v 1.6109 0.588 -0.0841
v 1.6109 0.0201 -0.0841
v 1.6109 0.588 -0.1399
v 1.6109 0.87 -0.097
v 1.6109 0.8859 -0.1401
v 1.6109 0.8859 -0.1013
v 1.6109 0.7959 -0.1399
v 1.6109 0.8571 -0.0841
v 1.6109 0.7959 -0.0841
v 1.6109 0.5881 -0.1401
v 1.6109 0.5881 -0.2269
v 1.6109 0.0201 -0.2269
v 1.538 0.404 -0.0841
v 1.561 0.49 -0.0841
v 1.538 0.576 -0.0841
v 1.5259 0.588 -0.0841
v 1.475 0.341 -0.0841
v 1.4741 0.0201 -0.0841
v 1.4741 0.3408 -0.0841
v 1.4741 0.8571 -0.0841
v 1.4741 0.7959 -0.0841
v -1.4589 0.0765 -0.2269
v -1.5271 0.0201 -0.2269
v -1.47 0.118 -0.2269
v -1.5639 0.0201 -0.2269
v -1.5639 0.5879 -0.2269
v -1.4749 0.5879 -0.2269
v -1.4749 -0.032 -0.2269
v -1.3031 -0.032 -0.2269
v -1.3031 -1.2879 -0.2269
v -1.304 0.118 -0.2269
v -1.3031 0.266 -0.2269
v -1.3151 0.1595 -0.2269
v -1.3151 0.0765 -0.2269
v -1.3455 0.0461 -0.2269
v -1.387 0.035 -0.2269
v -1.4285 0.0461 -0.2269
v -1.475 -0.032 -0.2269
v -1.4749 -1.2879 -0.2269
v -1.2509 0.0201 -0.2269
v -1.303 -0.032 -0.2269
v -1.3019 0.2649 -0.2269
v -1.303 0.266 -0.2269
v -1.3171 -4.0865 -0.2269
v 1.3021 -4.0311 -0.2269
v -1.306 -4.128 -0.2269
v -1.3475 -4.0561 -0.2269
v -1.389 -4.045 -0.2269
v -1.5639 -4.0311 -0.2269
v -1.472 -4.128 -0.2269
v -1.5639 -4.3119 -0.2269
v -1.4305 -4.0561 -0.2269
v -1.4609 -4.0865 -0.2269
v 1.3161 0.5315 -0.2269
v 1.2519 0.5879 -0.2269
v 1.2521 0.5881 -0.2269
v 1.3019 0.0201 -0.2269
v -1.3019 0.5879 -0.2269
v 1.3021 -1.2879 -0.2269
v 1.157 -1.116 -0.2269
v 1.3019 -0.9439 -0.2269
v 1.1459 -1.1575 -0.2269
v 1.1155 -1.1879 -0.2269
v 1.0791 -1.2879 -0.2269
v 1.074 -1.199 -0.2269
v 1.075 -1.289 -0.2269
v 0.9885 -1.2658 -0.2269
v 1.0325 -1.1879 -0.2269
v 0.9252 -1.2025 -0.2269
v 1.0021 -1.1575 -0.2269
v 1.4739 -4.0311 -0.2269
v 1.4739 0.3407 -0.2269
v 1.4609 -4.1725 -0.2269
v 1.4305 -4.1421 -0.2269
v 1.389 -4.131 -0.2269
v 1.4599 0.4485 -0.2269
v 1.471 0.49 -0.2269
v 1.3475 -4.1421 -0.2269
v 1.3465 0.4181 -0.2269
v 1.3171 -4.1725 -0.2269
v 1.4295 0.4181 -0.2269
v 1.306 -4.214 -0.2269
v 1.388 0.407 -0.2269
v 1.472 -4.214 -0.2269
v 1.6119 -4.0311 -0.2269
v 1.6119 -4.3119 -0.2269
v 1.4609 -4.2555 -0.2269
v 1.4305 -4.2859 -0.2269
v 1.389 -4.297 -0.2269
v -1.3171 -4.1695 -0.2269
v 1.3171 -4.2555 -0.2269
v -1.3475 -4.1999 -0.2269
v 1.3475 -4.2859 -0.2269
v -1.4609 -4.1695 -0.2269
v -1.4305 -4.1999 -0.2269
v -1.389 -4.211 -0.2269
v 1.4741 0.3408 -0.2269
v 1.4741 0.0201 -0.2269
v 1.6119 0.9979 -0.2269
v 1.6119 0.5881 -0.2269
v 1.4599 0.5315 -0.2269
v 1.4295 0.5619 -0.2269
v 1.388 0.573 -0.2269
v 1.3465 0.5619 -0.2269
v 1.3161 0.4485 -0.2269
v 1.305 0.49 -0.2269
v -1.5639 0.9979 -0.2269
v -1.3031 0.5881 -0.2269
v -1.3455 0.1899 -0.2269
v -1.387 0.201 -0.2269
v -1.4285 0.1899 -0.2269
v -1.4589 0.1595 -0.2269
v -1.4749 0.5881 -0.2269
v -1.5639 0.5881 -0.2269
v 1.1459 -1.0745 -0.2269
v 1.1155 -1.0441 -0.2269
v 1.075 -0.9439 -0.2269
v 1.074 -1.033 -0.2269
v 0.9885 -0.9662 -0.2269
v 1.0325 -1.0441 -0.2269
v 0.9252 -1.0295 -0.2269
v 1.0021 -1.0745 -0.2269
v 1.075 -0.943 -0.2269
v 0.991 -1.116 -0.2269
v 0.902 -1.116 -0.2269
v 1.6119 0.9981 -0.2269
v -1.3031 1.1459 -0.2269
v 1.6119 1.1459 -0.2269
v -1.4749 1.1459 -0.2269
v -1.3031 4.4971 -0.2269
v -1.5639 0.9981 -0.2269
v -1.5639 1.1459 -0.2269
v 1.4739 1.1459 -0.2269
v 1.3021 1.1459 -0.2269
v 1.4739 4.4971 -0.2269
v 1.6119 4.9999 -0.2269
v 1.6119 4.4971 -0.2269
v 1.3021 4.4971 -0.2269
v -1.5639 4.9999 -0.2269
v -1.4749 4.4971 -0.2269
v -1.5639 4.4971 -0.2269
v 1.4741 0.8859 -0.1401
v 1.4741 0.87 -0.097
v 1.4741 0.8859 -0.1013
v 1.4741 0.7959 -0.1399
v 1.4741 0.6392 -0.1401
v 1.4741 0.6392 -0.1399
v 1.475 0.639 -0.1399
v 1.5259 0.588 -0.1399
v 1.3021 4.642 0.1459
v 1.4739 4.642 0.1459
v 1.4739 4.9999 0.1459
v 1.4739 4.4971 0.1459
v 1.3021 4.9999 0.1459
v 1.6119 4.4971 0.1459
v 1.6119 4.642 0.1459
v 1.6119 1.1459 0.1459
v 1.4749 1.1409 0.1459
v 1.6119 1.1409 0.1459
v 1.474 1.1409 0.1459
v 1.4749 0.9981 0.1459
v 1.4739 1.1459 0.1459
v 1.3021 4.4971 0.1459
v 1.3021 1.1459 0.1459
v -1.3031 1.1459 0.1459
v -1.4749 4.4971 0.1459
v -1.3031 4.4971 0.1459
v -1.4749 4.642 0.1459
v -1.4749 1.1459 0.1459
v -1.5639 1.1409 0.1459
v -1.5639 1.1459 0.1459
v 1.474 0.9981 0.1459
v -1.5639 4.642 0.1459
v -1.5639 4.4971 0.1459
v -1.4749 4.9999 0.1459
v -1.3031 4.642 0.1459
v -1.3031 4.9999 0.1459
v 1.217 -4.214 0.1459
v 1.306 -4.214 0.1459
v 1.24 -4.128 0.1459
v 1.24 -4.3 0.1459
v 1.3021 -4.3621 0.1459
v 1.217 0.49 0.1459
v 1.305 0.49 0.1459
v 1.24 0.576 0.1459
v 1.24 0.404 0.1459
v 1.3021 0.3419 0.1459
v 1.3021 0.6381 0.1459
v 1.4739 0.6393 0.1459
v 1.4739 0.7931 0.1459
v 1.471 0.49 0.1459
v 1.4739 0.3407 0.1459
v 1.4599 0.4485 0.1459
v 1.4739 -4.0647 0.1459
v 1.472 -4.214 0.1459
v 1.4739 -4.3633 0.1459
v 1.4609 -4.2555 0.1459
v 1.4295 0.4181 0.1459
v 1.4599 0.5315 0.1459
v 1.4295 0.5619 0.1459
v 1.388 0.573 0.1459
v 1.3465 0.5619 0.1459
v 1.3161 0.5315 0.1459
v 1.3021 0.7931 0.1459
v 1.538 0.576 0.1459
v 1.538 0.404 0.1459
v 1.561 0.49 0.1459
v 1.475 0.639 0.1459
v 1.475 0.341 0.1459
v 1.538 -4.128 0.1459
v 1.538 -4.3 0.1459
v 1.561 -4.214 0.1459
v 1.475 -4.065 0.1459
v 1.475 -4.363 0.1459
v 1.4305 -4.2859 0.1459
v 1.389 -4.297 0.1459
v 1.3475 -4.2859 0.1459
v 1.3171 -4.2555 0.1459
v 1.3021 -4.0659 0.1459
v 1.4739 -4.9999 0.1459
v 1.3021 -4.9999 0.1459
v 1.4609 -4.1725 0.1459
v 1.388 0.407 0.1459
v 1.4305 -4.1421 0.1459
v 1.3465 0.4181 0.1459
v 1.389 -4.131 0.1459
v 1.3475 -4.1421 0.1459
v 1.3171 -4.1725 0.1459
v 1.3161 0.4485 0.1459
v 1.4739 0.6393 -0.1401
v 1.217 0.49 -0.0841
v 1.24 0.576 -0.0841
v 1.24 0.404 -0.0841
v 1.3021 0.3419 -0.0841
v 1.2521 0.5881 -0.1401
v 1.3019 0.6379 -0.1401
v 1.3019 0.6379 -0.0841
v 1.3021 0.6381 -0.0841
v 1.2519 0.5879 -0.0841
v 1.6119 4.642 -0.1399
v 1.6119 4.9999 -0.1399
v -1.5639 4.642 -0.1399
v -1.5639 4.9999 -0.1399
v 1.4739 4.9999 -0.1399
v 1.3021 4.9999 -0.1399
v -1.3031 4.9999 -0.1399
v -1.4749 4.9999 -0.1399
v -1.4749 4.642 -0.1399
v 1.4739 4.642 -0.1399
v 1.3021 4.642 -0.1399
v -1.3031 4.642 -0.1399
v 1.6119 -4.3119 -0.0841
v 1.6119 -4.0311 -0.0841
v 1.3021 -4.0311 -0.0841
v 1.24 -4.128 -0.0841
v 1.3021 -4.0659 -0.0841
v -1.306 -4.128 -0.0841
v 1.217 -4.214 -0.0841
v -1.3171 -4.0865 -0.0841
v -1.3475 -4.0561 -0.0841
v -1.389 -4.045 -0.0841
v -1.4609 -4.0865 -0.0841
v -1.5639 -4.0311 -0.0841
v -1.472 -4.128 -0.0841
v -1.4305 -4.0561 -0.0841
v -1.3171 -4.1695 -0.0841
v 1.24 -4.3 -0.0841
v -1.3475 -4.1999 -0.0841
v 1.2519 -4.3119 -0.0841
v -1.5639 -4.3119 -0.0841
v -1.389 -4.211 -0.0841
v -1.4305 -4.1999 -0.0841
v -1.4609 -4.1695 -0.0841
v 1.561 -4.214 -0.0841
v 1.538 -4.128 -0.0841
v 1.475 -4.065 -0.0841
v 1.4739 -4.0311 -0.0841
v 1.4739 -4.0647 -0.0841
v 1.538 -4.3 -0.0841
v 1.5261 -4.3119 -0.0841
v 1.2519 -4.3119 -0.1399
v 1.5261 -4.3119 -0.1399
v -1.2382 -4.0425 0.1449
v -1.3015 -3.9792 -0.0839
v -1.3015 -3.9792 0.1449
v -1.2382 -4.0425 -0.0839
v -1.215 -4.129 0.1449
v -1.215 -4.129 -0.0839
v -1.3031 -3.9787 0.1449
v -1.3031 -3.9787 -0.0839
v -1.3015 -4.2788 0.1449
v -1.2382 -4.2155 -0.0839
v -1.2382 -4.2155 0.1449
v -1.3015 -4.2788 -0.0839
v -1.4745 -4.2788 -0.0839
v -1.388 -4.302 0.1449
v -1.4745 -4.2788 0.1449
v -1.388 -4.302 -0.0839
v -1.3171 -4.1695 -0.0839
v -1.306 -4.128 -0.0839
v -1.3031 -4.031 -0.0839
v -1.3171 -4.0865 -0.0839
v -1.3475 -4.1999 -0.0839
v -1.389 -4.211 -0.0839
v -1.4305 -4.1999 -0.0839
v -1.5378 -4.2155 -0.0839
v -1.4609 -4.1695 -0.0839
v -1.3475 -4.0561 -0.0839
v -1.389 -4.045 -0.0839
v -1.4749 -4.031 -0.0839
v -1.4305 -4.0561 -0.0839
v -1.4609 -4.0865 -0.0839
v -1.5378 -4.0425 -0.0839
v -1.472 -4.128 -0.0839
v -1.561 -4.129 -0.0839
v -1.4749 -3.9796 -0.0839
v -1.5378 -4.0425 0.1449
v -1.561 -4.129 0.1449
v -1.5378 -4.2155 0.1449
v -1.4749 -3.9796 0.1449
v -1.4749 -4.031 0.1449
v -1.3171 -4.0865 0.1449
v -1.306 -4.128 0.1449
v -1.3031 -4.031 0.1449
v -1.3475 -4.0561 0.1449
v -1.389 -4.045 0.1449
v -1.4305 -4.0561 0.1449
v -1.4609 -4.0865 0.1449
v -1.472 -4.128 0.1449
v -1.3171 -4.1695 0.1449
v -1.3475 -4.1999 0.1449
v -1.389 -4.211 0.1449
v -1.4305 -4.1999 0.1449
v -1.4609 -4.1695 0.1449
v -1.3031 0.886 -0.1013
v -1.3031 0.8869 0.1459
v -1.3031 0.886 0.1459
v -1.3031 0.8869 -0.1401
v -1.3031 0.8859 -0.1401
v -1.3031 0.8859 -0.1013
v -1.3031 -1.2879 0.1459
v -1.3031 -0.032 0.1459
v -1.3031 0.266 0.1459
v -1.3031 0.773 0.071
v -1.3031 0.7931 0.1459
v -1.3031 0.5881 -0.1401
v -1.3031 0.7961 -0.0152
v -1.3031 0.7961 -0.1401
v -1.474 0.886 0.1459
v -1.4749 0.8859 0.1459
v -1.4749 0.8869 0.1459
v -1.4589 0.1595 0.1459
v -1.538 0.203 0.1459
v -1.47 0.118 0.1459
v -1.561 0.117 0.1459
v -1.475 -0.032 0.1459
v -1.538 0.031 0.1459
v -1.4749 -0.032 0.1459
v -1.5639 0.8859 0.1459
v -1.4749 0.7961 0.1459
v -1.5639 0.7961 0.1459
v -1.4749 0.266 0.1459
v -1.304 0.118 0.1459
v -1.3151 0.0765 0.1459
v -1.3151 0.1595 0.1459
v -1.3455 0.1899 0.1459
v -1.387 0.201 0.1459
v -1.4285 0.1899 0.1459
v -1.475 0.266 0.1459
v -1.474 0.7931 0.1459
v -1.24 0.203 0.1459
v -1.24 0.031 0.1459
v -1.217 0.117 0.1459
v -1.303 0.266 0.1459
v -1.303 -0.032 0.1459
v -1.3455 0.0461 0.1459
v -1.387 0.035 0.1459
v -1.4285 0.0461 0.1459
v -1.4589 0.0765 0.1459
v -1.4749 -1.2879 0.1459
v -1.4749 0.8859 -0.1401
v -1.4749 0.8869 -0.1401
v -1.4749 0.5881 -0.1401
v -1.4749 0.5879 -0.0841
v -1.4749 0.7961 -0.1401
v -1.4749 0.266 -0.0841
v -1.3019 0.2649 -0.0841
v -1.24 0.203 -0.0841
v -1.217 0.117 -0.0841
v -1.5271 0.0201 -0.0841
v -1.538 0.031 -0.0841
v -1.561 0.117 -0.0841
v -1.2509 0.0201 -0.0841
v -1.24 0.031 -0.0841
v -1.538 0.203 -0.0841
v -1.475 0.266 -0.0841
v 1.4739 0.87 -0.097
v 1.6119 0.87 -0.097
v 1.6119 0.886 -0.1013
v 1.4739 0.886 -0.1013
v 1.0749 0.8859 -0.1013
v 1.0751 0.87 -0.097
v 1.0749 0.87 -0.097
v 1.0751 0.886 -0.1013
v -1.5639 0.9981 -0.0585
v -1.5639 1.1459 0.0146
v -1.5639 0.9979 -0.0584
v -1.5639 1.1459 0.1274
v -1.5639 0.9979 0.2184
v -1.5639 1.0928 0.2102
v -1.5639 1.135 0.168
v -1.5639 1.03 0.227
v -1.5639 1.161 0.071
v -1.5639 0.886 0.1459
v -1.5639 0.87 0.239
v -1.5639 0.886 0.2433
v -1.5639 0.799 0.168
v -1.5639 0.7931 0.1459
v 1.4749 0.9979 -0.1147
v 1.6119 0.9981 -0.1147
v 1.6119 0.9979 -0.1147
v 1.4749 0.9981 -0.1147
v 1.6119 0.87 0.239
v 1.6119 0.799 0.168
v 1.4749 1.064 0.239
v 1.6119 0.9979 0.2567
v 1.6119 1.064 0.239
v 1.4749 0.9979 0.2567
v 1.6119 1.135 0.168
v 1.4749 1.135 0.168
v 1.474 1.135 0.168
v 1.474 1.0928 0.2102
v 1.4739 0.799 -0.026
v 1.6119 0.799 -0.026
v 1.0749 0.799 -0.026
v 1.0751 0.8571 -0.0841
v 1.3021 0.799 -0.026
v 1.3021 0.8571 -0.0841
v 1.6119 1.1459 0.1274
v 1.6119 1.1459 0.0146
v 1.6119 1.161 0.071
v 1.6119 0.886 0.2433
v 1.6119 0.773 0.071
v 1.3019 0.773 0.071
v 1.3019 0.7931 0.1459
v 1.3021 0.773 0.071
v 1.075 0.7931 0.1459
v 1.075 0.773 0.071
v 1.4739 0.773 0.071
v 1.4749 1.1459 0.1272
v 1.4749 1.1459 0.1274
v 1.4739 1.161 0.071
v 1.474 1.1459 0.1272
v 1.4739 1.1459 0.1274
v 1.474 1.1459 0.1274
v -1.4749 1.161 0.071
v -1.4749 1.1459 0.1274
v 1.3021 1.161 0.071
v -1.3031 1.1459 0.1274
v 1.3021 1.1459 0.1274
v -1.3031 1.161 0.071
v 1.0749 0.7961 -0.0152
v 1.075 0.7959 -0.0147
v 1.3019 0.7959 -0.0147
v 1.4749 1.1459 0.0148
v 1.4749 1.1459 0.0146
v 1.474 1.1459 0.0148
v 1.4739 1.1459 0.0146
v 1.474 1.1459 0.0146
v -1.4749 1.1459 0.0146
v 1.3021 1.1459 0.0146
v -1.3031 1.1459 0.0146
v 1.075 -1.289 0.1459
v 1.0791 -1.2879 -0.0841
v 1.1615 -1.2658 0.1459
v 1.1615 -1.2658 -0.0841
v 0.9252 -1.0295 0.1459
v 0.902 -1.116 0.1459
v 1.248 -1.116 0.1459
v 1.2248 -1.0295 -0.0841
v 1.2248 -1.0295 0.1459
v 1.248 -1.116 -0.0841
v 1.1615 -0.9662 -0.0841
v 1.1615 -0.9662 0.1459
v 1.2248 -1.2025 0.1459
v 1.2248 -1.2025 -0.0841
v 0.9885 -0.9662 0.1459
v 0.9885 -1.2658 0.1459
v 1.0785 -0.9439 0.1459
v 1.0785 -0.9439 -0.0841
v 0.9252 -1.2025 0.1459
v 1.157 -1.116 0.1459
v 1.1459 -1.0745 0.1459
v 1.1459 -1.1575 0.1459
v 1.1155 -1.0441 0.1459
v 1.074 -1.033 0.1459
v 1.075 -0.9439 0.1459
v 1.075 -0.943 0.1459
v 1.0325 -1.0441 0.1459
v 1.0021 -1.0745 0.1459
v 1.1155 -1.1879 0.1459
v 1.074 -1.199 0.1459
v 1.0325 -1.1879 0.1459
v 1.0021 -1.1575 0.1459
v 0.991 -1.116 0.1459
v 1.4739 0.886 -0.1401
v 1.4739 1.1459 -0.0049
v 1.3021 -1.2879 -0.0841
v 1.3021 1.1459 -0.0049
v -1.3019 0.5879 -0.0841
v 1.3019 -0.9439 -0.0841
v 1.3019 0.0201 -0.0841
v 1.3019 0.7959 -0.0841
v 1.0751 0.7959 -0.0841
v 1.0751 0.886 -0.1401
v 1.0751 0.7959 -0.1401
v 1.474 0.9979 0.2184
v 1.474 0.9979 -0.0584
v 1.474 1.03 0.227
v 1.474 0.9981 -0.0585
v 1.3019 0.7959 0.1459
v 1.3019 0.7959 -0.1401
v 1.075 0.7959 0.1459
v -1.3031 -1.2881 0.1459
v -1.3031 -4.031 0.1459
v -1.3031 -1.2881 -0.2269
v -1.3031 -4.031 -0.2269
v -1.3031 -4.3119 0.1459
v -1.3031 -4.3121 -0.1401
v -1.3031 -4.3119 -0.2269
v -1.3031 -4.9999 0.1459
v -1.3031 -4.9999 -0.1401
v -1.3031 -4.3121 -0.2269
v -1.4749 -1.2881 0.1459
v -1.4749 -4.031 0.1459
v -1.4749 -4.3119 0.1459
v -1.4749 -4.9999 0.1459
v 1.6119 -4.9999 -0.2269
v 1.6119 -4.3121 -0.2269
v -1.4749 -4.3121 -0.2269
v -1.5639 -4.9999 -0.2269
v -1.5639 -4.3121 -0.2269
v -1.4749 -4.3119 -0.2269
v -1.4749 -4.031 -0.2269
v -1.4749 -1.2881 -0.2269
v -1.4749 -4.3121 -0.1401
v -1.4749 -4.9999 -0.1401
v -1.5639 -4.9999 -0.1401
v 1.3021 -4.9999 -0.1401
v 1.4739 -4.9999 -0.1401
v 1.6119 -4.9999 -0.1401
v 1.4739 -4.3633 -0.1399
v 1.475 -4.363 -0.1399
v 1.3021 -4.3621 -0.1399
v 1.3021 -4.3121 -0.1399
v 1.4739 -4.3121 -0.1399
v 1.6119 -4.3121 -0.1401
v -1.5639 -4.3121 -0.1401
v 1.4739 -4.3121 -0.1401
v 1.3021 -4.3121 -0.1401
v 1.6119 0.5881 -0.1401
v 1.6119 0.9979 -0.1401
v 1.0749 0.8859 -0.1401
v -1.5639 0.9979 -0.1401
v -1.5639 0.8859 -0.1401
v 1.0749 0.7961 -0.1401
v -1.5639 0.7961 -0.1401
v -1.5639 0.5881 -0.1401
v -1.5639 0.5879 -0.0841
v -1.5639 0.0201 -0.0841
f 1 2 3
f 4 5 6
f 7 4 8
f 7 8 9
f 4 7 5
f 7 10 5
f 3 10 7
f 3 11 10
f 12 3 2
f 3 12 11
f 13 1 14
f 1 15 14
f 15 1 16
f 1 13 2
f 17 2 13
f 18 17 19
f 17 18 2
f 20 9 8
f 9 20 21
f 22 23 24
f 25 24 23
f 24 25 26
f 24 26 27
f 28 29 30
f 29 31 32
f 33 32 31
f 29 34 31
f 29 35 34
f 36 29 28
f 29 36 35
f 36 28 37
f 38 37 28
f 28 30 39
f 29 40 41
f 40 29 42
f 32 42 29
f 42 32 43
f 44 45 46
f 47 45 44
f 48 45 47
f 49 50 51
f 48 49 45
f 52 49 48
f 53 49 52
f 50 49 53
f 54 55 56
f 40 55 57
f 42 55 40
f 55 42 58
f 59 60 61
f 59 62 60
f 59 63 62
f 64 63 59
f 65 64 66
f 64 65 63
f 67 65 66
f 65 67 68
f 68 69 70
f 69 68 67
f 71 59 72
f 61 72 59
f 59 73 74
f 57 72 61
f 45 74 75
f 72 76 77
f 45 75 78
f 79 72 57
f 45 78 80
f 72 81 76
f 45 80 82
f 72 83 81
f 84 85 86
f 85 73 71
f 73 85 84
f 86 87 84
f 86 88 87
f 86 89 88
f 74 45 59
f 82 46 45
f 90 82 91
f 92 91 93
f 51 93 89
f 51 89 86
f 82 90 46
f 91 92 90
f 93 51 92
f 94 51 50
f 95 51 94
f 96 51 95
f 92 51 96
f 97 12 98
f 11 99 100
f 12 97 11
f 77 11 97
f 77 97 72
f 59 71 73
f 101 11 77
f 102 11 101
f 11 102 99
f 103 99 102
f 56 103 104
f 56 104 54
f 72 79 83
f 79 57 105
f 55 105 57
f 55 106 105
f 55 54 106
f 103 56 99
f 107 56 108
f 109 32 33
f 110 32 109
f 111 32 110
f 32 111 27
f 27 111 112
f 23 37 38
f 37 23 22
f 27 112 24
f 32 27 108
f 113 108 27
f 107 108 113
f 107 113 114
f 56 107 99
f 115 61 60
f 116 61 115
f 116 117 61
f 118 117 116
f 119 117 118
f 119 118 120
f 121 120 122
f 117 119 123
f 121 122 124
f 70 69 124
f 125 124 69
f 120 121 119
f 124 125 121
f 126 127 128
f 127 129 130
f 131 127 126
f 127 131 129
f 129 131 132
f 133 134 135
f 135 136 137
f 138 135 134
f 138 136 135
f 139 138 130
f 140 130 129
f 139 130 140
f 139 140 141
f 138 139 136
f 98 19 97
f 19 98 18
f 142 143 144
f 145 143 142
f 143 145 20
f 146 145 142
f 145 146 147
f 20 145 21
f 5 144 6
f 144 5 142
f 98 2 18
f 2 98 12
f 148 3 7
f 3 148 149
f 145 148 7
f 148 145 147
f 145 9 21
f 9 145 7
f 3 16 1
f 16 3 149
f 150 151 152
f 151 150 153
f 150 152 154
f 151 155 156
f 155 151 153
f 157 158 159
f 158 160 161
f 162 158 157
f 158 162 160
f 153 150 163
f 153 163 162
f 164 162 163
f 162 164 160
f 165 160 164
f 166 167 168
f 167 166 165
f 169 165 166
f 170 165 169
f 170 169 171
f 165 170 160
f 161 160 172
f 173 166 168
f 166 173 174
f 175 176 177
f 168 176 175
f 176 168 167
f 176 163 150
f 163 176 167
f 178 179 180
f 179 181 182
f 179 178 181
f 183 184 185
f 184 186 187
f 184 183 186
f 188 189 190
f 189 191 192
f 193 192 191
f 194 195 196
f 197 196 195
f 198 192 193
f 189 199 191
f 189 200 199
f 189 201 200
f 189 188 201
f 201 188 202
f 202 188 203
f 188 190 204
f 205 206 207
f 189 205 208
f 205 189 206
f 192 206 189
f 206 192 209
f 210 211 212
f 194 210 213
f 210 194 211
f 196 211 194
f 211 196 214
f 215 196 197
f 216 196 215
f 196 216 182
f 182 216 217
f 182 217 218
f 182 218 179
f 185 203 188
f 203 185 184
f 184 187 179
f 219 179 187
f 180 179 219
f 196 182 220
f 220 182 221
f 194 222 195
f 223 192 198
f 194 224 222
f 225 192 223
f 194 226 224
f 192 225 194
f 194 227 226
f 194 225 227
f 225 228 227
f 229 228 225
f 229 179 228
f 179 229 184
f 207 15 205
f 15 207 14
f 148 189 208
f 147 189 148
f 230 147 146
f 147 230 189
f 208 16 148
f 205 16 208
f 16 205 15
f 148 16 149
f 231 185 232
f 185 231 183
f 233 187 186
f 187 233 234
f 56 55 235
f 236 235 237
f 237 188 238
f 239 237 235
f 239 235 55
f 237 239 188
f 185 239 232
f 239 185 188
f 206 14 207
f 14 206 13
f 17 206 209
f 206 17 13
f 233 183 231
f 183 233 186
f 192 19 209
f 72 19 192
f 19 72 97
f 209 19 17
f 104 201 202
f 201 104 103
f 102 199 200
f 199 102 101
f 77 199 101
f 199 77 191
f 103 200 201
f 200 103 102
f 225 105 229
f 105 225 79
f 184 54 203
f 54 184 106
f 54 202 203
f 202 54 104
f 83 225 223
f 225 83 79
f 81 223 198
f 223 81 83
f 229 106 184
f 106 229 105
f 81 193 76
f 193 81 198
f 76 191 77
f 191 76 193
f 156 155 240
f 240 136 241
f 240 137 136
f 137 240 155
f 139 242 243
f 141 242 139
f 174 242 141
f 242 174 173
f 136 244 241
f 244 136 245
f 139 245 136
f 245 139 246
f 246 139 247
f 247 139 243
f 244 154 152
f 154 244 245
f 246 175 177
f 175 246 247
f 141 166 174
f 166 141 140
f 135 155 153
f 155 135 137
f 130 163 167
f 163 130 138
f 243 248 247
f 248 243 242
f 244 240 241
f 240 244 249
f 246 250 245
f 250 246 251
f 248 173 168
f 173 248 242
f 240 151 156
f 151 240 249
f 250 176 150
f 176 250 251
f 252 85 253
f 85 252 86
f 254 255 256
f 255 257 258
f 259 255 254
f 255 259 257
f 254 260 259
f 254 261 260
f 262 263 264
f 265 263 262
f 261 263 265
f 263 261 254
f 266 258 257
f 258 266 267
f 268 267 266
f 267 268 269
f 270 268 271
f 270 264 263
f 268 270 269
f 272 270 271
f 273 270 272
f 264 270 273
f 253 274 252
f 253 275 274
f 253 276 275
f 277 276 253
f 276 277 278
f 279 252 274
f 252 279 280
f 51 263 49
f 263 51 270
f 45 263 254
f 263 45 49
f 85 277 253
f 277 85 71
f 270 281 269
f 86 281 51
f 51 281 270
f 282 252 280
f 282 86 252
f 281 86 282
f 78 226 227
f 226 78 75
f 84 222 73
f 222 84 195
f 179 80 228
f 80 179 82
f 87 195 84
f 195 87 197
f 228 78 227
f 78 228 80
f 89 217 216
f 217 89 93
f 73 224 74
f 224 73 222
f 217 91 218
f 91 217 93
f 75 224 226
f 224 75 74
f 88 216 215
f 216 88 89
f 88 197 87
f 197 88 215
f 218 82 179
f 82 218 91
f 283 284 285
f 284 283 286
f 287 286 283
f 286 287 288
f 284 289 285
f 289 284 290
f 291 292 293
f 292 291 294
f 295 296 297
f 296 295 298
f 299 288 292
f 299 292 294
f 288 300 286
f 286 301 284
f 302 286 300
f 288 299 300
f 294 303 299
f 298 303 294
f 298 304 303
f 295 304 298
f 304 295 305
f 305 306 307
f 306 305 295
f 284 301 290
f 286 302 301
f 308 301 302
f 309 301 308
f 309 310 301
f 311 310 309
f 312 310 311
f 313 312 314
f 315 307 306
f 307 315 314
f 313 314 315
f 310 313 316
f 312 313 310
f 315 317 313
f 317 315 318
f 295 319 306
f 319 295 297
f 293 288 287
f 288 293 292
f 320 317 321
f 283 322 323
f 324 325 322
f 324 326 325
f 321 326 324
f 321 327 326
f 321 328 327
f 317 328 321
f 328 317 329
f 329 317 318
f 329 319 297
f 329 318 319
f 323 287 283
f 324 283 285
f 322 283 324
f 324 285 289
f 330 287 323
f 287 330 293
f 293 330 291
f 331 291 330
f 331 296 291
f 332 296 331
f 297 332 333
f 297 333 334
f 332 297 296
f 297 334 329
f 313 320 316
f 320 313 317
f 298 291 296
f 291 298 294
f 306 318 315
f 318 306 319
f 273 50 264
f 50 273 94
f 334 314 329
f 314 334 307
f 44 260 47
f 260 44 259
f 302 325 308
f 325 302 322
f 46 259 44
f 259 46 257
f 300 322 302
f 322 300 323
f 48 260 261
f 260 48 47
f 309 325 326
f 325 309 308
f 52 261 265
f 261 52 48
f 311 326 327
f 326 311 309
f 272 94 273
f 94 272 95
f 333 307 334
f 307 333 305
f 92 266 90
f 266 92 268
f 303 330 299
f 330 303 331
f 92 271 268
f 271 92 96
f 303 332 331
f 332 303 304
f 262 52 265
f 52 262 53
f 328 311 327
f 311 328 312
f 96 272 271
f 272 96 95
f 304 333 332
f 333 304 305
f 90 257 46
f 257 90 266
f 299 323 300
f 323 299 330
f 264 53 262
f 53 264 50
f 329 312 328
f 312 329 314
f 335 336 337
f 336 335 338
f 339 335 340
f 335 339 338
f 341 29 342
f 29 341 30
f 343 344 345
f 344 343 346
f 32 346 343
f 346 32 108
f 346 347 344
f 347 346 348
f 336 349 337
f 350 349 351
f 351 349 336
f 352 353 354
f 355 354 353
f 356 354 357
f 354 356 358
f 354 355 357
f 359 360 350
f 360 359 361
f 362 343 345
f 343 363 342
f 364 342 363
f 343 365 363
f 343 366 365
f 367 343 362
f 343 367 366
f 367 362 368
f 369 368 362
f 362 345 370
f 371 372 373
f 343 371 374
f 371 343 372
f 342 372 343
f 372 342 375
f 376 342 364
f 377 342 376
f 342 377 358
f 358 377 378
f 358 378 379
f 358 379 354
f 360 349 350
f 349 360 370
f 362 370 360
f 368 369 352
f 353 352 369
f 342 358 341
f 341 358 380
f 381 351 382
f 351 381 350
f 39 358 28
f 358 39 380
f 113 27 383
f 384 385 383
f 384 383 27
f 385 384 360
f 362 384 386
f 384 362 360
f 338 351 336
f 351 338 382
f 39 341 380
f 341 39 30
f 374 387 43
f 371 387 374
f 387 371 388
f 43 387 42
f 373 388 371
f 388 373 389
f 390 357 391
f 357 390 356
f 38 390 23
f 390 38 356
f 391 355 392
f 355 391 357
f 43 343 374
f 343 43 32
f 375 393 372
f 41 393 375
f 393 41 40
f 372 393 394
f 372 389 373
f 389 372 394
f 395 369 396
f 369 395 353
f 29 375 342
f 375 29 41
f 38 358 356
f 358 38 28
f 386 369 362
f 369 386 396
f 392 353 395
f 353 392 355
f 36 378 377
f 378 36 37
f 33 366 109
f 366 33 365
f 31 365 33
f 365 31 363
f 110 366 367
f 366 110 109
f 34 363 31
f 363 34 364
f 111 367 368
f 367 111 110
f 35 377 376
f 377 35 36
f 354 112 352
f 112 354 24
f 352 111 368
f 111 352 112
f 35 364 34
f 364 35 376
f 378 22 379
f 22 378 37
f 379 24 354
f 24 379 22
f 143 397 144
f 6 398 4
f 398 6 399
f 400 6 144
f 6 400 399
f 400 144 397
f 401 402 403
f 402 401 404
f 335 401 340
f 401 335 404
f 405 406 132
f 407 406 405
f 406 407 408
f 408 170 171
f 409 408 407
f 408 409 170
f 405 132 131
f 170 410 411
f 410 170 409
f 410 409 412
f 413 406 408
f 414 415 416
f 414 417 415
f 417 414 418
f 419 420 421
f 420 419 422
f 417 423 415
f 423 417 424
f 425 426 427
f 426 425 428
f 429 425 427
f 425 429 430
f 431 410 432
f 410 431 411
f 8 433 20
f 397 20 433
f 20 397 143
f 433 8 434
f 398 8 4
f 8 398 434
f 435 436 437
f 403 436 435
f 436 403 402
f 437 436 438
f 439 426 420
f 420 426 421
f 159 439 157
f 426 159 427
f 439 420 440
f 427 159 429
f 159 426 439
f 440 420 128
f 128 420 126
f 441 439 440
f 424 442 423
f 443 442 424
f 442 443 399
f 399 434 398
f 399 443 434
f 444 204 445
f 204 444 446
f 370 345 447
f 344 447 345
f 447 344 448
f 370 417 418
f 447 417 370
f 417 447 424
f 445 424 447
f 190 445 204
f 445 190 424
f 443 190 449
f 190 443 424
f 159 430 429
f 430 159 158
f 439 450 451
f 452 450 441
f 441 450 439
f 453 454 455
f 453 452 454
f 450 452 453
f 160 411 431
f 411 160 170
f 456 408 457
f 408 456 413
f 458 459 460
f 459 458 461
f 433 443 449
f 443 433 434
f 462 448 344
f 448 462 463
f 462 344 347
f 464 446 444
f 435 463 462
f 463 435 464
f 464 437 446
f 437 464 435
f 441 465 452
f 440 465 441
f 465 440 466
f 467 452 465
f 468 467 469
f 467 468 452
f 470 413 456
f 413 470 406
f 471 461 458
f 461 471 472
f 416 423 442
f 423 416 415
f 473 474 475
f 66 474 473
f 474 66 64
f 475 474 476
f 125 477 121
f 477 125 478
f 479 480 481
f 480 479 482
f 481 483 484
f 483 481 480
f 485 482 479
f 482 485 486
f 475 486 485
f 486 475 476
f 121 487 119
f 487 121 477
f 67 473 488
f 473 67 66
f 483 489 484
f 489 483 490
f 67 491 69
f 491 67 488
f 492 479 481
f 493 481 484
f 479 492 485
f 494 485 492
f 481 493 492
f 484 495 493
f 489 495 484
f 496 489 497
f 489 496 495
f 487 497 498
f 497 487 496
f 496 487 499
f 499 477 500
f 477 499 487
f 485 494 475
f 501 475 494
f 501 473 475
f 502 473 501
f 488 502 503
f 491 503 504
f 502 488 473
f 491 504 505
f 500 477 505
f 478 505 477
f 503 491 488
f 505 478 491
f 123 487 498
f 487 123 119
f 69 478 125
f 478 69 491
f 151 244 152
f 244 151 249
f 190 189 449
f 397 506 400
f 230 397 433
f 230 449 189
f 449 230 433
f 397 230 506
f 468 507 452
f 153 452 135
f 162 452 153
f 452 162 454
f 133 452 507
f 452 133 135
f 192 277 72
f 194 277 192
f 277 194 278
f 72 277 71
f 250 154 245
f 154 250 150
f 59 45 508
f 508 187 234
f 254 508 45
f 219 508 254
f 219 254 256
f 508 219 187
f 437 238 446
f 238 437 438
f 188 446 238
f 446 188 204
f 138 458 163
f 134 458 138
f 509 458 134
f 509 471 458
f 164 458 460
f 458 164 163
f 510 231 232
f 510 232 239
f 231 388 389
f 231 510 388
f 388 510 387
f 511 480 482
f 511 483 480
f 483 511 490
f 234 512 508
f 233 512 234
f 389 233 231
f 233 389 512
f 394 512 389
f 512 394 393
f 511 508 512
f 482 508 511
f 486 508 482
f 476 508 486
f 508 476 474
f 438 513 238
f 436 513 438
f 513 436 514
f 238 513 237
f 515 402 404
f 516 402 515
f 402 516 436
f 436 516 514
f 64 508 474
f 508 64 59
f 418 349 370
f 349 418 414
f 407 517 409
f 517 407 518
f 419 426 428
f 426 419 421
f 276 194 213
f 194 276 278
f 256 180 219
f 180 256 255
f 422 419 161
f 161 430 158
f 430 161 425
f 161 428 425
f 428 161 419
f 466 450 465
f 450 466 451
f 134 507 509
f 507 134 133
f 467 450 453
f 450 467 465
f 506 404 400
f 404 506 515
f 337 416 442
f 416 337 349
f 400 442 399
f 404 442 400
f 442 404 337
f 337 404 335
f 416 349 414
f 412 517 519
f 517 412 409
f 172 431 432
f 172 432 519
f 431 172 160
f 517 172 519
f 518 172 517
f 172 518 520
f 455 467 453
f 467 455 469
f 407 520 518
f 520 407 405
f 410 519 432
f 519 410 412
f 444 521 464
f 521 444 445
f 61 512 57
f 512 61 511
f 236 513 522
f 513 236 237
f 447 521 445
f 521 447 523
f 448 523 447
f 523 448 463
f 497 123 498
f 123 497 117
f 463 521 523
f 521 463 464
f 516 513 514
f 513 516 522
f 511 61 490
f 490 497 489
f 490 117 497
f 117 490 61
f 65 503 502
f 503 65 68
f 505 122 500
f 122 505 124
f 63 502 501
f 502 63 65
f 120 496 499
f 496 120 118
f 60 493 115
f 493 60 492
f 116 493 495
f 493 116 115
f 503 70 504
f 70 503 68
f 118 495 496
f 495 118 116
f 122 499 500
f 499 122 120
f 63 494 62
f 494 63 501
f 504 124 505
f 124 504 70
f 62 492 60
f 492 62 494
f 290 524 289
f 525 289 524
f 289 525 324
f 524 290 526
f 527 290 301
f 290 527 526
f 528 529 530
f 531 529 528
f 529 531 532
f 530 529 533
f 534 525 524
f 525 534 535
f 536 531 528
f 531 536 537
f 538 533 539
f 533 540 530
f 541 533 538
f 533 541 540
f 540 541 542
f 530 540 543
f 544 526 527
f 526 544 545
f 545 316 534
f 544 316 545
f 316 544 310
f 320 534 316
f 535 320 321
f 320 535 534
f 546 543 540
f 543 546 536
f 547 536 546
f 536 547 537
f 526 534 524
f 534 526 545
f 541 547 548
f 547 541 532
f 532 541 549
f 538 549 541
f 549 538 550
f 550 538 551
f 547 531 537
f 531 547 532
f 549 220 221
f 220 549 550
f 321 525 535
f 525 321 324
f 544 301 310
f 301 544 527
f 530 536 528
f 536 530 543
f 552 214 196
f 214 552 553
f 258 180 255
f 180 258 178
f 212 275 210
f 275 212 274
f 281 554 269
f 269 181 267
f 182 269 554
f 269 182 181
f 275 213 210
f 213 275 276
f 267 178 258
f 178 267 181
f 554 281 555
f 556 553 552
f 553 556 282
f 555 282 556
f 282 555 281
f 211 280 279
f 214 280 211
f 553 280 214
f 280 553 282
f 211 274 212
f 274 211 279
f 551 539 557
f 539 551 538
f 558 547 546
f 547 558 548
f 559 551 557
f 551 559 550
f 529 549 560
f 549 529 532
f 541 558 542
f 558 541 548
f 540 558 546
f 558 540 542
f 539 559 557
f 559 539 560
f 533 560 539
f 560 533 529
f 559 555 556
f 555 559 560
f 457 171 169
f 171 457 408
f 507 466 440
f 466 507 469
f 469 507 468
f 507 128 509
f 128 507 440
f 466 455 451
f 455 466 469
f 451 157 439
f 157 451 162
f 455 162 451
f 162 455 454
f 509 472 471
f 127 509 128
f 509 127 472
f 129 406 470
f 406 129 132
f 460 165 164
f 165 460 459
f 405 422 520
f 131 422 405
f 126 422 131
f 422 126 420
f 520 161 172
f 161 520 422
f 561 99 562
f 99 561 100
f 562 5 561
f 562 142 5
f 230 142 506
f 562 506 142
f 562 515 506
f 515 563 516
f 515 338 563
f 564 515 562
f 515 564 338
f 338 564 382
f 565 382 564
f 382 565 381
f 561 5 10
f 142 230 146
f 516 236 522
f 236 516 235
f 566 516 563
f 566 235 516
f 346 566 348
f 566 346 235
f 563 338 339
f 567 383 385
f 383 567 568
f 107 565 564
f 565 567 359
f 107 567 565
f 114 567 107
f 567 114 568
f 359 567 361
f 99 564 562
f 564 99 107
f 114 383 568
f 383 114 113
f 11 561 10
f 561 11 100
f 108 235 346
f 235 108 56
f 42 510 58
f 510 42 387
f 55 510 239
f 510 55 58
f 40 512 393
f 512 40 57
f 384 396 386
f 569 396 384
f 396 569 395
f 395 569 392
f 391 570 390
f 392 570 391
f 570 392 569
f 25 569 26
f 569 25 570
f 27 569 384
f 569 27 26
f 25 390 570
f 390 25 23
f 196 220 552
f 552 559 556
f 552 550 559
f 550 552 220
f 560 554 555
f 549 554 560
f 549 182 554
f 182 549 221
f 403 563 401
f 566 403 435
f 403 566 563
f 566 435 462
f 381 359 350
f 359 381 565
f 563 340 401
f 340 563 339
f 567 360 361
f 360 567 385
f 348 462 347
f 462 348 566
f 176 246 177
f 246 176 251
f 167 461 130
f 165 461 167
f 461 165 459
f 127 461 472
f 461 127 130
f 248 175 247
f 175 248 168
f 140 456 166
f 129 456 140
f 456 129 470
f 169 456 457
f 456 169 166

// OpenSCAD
intersection() {
  union() {
    difference() {
      translate([1.5425, 0.453, -0.1555])
      cube(size = [0.1368, 0.8658, 0.1428], center = true);
    
      translate([9.701, 0.692, 0.003])
      cube(size = [16.7979, 0.2079, 0.2859], center = true);
    }
  
    translate([0.024, 1.072, -0.0405])
    cube(size = [3.1758, 0.1478, 0.3728], center = true);
  
    translate([0.024, 0.793, -0.1835])
    cube(size = [3.1758, 0.4098, 0.0868], center = true);
  
    translate([0.0005, 0.304, -0.1555])
    cube(size = [2.6048, 0.5678, 0.1428], center = true);
  
    translate([-1.519, 0.304, -0.1555])
    cube(size = [0.0898, 0.5678, 0.1428], center = true);
  
    difference() {
      translate([1.389, 0.49, -0.0405])
      rotate([180, 0, 180])
      cylinder(h = 0.3728, r1 = 0.172, r2 = 0.172, center = true, $fn = 12);
    
      translate([1.388, 0.49, -0.0405])
      rotate([180, 0, 180])
      cylinder(h = 0.3729, r1 = 0.083, r2 = 0.083, center = true, $fn = 12);
    }
  
    translate([1.388, -4.656, -0.0405])
    cube(size = [0.1718, 0.6878, 0.3728], center = true);
  
    difference() {
      translate([0.024, 4.7485, -0.0405])
      cube(size = [3.1758, 0.5028, 0.3728], center = true);
    
      translate([0, 4.821, 8.98])
      cube(size = [36.1999, 0.3579, 18.2399], center = true);
    }
  
    difference() {
      union() {
        translate([-1.388, -4.129, 0.0305])
        cylinder(h = 0.2288, r1 = 0.173, r2 = 0.173, center = true, $fn = 12);
      
        difference() {
          translate([0.024, -4.1715, -0.1555])
          cube(size = [3.1758, 0.2808, 0.1428], center = true);
        
          translate([1.389, -4.214, 8.9365])
          rotate([180, 0, 180])
          cylinder(h = 18.3269, r1 = 0.083, r2 = 0.083, center = true, $fn = 12);
        }
      }
    
      translate([-1.389, -4.128, 0])
      cylinder(h = 36.1999, r1 = 0.083, r2 = 0.083, center = true, $fn = 12);
    }
  
    translate([-0.2445, 0.841, -0.0405])
    cube(size = [2.6388, 0.0898, 0.3728], center = true);
  
    difference() {
      union() {
        translate([-1.389, -0.2005, -0.0405])
        cube(size = [0.1718, 2.1748, 0.3728], center = true);
      
        translate([-1.389, 0.117, -0.0405])
        cylinder(h = 0.3728, r1 = 0.172, r2 = 0.172, center = true, $fn = 12);
      }
    
      translate([-1.387, 0.118, -0.0405])
      cylinder(h = 0.3729, r1 = 0.083, r2 = 0.083, center = true, $fn = 12);
    }
  
    difference() {
      difference() {
        union() {
          translate([0.024, 0.967, 0.071])
          rotate([180, 90, 180])
          cylinder(h = 3.1758, r1 = 0.194, r2 = 0.194, center = true, $fn = 12);
        
          translate([1.075, -1.116, -0.0405])
          rotate([180, 0, 180])
          cylinder(h = 0.3728, r1 = 0.173, r2 = 0.173, center = true, $fn = 12);
        
          translate([1.388, 0.344, -0.0405])
          cube(size = [0.1718, 9.3118, 0.3728], center = true);
        
          translate([1.2745, -0.2005, -0.1555])
          cube(size = [0.3988, 2.1748, 0.1428], center = true);
        }
      
        intersection() {
          translate([8.268, -8.551, 8.9365])
          cube(size = [19.6639, 19.0979, 18.3269], center = true);
        
          union() {
            translate([-1.519, 0.027, -8.977])
            cube(size = [0.0899, 1.9419, 18.2459], center = true);
          
            translate([1.389, -4.214, -0.0405])
            rotate([180, 0, 180])
            cylinder(h = 0.3729, r1 = 0.172, r2 = 0.172, center = true, $fn = 12);
          }
        }
      }
    
      union() {
        difference() {
          translate([-0.0445, 1.016, 8.9365])
          cube(size = [3.0389, 0.2599, 18.3269], center = true);
        
          translate([-8.313, 1.03, 0.08])
          rotate([180, 90, 180])
          cylinder(h = 19.574, r1 = 0.147, r2 = 0.147, center = true, $fn = 12);
        }
      
        intersection() {
          union() {
            translate([0.024, 0.942, 8.9365])
            cube(size = [3.1759, 0.1119, 18.3269], center = true);
          
            translate([1.1885, -8.652, -0.0405])
            cube(size = [0.2269, 18.8959, 0.3729], center = true);
          }
        
          translate([0.024, 0.101, 8.9365])
          cube(size = [3.1759, 2.0899, 18.3269], center = true);
        }
      
        translate([1.074, -1.116, 8.9365])
        rotate([180, 0, 180])
        cylinder(h = 18.3269, r1 = 0.083, r2 = 0.083, center = true, $fn = 12);
      
        translate([1.389, 0.49, -0.0405])
        rotate([180, 0, 180])
        cylinder(h = 0.3729, r1 = 0.172, r2 = 0.172, center = true, $fn = 12);
      }
    }
  
    difference() {
      union() {
        translate([1.389, -4.214, 0.003])
        rotate([180, 0, 180])
        cylinder(h = 0.2858, r1 = 0.172, r2 = 0.172, center = true, $fn = 12);
      
        translate([0.024, -4.656, -0.1835])
        cube(size = [3.1758, 0.6878, 0.0868], center = true);
      
        difference() {
          translate([-1.389, -3.144, -0.0405])
          cube(size = [0.1718, 3.7118, 0.3728], center = true);
        
          translate([-0.0005, -4.1715, -0.0405])
          cube(size = [2.9489, 0.2809, 0.3729], center = true);
        }
      }
    
      translate([1.389, -4.214, 0.003])
      rotate([180, 0, 180])
      cylinder(h = 0.2859, r1 = 0.083, r2 = 0.083, center = true, $fn = 12);
    }
  
    translate([-1.389, 2.999, -0.0405])
    cube(size = [0.1718, 4.0018, 0.3728], center = true);
  }

  translate([-0.0005, 0, 0])
  cube(size = [3.8828, 11.9998, 0.5458], center = true);
}
